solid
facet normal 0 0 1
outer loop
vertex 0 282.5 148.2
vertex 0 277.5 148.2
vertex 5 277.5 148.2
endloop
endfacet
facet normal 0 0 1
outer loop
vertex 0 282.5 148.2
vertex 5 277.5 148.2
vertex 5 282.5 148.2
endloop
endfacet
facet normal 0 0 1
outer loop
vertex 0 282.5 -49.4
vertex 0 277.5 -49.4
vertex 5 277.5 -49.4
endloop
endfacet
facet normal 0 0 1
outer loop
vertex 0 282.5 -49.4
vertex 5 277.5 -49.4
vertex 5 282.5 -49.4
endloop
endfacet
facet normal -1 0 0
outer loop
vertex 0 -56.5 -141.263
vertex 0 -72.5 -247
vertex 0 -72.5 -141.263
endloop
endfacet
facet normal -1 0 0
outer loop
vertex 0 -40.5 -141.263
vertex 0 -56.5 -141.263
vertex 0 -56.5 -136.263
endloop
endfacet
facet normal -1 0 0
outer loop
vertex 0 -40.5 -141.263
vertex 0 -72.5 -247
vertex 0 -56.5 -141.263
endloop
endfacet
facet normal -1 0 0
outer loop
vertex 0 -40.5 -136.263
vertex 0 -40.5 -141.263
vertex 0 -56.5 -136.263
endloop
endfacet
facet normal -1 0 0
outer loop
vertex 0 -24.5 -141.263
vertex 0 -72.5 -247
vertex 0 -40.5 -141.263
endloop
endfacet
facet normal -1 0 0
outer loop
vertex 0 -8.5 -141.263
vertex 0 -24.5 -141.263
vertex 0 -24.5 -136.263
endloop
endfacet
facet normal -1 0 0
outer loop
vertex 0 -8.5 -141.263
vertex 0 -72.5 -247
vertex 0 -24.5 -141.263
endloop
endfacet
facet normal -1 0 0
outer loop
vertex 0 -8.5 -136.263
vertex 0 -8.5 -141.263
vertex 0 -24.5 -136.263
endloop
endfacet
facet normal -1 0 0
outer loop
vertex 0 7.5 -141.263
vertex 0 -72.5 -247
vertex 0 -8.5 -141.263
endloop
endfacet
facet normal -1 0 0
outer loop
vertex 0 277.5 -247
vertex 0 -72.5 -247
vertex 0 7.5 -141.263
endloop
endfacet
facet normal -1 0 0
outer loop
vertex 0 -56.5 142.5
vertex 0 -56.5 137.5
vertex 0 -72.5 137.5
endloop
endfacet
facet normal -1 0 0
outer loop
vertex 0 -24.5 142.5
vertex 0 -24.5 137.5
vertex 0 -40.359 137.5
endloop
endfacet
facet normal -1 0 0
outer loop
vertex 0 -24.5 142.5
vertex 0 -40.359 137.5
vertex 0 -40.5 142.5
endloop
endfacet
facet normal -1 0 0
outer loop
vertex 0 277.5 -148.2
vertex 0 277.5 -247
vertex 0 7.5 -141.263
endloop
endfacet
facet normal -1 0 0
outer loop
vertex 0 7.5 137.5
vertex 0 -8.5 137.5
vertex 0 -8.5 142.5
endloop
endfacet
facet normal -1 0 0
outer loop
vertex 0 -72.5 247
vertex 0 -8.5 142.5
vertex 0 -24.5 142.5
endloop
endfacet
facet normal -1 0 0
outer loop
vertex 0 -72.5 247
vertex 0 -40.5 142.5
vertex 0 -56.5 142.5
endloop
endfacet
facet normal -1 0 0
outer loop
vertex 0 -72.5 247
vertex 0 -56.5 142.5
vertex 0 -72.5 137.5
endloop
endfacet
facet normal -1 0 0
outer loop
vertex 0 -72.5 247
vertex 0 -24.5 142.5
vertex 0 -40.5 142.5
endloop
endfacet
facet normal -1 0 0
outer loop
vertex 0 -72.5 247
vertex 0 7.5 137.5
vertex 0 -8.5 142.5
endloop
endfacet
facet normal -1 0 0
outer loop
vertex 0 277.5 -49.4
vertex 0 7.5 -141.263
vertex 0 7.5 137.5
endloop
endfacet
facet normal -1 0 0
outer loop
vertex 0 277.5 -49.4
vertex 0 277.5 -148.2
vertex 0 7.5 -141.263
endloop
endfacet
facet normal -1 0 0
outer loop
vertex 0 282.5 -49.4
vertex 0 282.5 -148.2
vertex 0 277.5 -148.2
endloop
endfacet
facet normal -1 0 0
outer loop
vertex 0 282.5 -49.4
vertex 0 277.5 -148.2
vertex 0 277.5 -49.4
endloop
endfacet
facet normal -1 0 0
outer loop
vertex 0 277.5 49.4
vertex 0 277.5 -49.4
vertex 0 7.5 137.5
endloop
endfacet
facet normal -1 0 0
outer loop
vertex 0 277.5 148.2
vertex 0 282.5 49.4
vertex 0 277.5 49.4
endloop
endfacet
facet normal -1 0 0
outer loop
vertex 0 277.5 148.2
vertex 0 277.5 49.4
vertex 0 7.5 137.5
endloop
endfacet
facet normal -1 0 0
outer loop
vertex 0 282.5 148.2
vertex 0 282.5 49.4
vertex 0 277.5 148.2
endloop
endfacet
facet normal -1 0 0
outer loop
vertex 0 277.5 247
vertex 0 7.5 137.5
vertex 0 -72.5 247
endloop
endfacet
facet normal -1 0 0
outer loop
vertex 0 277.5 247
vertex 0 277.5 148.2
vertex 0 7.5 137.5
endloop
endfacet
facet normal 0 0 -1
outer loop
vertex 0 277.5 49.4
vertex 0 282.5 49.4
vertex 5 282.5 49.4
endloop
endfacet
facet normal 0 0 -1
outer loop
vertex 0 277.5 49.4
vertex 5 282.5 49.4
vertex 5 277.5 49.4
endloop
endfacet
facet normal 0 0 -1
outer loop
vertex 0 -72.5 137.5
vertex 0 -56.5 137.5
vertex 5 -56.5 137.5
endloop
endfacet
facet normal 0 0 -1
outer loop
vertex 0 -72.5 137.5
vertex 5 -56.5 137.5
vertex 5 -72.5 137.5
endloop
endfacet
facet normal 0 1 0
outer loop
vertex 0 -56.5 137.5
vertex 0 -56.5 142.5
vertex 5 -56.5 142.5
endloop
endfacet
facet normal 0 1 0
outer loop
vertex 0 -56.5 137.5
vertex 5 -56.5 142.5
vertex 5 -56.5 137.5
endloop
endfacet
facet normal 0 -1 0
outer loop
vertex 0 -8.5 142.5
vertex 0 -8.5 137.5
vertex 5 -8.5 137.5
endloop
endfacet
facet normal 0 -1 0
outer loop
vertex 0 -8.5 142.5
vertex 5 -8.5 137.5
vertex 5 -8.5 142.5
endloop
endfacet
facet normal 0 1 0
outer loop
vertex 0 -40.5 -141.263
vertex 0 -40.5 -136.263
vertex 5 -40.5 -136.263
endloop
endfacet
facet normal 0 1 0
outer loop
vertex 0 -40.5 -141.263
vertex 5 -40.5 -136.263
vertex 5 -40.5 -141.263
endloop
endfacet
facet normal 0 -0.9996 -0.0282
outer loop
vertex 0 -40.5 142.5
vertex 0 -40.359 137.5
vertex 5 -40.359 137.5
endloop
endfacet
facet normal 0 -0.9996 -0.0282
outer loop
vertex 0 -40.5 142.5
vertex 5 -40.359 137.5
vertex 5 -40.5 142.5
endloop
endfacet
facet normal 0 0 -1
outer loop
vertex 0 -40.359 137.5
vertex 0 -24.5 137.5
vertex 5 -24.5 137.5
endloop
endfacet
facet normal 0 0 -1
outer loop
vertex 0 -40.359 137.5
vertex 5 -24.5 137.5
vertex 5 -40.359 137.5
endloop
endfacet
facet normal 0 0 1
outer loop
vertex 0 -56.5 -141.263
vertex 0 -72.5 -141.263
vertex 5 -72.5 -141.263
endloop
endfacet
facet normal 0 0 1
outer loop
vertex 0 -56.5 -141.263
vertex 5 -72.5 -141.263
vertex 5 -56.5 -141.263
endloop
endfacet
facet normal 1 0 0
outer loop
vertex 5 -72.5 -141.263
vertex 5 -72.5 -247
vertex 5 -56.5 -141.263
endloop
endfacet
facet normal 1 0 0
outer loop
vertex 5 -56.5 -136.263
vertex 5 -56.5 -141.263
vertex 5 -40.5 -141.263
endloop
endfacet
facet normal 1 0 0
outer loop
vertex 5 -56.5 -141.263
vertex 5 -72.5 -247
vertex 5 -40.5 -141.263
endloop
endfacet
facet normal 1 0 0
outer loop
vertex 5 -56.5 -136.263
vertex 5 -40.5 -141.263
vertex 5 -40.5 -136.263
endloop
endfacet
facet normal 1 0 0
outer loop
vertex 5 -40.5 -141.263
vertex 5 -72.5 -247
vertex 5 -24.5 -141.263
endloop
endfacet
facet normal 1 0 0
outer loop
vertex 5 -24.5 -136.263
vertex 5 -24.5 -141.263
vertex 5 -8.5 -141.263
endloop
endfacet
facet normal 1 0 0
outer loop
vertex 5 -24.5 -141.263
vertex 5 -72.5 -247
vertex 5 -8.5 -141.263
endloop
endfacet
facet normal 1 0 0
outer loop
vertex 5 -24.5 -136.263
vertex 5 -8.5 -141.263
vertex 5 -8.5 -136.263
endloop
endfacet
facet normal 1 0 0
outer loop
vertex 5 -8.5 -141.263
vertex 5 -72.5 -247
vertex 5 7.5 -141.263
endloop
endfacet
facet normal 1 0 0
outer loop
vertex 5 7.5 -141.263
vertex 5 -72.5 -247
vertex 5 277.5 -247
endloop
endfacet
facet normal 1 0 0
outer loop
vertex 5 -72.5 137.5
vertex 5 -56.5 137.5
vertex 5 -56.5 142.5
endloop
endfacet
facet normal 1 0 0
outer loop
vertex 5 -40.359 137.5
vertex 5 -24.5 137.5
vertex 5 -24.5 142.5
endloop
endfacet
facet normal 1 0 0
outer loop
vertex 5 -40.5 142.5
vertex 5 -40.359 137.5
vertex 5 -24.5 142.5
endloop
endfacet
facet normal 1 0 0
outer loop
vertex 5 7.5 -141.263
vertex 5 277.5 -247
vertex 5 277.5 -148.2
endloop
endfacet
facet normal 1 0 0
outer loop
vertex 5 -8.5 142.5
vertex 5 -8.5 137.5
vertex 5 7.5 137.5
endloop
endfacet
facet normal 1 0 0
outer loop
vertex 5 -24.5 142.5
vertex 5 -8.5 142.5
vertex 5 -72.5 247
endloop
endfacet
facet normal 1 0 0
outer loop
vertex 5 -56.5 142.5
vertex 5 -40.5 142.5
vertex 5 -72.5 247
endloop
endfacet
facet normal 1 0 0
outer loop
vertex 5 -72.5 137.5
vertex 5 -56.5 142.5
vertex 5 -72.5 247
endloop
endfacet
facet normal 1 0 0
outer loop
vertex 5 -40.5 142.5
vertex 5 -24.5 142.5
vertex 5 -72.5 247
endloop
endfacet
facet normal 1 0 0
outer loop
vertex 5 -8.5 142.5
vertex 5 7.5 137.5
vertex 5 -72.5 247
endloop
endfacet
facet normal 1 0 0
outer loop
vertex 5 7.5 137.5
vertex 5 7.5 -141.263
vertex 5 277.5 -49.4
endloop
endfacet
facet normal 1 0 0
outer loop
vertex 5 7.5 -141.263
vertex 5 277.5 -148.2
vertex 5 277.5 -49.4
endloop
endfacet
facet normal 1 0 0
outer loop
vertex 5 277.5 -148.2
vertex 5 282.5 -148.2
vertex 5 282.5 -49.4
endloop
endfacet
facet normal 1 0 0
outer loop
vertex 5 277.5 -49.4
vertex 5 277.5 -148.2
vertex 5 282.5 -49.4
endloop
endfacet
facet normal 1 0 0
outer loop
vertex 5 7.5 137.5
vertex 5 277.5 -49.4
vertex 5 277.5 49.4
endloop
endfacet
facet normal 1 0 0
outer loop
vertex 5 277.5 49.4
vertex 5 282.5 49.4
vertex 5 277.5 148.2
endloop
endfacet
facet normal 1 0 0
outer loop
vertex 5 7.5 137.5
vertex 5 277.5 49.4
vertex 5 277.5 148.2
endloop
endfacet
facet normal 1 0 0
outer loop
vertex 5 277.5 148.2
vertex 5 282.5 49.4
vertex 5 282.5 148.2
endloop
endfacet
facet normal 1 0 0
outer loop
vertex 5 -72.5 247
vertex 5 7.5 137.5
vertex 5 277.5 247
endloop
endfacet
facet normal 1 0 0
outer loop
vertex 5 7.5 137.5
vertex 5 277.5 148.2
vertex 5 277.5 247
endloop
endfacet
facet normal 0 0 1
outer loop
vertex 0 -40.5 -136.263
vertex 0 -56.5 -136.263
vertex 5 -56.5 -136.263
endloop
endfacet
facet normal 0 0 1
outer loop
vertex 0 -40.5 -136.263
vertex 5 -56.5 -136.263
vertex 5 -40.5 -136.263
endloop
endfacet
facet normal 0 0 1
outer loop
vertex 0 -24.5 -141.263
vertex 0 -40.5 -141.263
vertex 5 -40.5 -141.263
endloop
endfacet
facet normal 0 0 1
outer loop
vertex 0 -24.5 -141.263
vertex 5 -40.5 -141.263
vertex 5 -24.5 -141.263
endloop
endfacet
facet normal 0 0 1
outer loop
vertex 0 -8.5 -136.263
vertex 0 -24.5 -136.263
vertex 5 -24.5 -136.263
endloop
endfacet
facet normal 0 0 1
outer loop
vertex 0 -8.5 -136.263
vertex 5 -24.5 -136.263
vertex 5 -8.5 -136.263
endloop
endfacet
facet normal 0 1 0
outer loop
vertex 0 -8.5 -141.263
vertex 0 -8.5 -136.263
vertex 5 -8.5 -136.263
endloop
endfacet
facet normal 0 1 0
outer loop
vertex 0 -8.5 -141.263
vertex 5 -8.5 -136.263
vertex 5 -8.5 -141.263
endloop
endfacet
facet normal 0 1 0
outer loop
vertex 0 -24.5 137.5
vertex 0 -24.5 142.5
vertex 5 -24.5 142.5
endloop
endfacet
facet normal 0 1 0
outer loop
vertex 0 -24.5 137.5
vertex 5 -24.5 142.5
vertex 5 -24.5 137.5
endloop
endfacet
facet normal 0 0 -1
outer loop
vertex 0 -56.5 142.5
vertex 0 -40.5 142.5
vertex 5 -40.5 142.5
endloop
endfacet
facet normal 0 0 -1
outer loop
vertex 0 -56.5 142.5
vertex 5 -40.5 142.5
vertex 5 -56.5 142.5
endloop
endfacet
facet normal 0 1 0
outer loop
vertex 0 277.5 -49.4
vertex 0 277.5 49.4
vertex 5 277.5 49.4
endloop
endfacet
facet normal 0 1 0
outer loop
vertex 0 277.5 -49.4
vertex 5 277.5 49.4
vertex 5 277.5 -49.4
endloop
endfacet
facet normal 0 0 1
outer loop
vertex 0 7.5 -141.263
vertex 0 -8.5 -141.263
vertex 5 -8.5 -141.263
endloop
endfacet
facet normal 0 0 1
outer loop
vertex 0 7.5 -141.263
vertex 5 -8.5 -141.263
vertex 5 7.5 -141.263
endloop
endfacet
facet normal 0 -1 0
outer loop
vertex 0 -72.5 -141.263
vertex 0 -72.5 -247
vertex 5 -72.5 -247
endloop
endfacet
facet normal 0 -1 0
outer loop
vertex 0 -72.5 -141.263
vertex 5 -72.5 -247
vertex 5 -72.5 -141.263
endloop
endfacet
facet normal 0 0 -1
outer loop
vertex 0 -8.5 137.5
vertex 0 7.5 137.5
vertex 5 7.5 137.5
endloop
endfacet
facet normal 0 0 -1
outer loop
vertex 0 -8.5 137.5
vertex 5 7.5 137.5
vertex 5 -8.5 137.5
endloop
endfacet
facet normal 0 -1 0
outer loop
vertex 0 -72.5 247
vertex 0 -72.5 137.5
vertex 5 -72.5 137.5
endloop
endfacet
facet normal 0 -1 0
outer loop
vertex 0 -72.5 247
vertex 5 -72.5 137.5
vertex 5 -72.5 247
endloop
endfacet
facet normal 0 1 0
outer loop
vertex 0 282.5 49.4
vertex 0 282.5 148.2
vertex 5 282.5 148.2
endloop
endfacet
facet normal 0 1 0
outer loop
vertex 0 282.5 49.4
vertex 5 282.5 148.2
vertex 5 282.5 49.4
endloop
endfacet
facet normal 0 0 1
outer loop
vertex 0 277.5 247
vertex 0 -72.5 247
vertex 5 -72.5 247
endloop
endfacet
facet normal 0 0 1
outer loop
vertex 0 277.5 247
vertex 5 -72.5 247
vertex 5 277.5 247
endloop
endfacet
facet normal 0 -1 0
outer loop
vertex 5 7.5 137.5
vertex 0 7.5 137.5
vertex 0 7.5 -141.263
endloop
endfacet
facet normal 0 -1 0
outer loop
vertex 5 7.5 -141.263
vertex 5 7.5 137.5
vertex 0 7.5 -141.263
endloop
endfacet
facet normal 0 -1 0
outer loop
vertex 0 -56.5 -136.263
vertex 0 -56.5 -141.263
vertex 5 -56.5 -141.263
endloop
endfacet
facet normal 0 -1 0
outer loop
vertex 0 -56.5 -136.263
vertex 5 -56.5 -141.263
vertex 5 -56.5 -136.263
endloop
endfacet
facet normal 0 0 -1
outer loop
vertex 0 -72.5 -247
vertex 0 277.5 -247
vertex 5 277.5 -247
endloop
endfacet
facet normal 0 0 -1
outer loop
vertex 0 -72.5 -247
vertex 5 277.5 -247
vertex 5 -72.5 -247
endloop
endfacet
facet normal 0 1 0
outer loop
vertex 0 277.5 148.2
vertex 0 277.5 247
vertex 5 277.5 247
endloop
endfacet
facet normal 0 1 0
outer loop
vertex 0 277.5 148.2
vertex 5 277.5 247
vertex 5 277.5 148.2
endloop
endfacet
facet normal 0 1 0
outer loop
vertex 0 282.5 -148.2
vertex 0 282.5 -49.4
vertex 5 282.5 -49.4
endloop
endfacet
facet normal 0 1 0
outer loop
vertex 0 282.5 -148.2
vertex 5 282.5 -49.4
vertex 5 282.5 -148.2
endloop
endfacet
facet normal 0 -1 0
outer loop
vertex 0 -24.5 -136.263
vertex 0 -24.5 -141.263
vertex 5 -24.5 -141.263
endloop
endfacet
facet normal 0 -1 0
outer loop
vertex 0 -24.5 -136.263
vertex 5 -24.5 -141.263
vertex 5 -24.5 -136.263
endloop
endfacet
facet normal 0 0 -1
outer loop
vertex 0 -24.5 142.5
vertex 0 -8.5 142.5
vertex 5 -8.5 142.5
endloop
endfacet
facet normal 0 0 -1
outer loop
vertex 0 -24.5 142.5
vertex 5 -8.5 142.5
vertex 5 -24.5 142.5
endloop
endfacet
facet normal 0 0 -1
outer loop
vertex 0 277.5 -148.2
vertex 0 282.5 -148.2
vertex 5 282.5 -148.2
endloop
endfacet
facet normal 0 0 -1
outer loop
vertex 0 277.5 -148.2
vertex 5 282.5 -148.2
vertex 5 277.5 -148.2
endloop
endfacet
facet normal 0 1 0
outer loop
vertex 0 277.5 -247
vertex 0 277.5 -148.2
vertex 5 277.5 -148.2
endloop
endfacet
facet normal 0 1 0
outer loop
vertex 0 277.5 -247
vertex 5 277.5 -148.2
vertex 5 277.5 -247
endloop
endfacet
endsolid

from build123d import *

# Parameters (mm, degrees)
BOSS_EXTRUDE1_DEPTH = 5


with BuildPart() as part:
    # Sketch1 → Boss-Extrude1 (new body)
    with BuildSketch(Plane(origin=(0, 0, 0), x_dir=(0, 0, -1), z_dir=(1, 0, 0))):
        Polygon((-247, 277.5), (-148.2, 277.5), (-148.2, 282.5), (-49.4, 282.5), (-49.4, 277.5), (49.4, 277.5), (49.4, 282.5), (148.2, 282.5), (148.2, 277.5), (247, 277.5), (247, -72.5), (141.262721236, -72.5), (141.262721236, -56.5), (136.262721236, -56.5), (136.262721236, -40.5), (141.262721236, -40.5), (141.262721236, -24.5), (136.262721236, -24.5), (136.262721236, -8.5), (141.262721236, -8.5), (141.262721236, 7.5), (0, 7.5), (-137.5, 7.5), (-137.5, -8.5), (-142.5, -8.5), (-142.5, -24.5), (-137.5, -24.5), (-137.5, -40.359311741), (-142.5, -40.5), (-142.5, -56.5), (-137.5, -56.5), (-137.5, -72.5), (-247, -72.5), align=None)
    extrude(amount=BOSS_EXTRUDE1_DEPTH)


solid = part.part
